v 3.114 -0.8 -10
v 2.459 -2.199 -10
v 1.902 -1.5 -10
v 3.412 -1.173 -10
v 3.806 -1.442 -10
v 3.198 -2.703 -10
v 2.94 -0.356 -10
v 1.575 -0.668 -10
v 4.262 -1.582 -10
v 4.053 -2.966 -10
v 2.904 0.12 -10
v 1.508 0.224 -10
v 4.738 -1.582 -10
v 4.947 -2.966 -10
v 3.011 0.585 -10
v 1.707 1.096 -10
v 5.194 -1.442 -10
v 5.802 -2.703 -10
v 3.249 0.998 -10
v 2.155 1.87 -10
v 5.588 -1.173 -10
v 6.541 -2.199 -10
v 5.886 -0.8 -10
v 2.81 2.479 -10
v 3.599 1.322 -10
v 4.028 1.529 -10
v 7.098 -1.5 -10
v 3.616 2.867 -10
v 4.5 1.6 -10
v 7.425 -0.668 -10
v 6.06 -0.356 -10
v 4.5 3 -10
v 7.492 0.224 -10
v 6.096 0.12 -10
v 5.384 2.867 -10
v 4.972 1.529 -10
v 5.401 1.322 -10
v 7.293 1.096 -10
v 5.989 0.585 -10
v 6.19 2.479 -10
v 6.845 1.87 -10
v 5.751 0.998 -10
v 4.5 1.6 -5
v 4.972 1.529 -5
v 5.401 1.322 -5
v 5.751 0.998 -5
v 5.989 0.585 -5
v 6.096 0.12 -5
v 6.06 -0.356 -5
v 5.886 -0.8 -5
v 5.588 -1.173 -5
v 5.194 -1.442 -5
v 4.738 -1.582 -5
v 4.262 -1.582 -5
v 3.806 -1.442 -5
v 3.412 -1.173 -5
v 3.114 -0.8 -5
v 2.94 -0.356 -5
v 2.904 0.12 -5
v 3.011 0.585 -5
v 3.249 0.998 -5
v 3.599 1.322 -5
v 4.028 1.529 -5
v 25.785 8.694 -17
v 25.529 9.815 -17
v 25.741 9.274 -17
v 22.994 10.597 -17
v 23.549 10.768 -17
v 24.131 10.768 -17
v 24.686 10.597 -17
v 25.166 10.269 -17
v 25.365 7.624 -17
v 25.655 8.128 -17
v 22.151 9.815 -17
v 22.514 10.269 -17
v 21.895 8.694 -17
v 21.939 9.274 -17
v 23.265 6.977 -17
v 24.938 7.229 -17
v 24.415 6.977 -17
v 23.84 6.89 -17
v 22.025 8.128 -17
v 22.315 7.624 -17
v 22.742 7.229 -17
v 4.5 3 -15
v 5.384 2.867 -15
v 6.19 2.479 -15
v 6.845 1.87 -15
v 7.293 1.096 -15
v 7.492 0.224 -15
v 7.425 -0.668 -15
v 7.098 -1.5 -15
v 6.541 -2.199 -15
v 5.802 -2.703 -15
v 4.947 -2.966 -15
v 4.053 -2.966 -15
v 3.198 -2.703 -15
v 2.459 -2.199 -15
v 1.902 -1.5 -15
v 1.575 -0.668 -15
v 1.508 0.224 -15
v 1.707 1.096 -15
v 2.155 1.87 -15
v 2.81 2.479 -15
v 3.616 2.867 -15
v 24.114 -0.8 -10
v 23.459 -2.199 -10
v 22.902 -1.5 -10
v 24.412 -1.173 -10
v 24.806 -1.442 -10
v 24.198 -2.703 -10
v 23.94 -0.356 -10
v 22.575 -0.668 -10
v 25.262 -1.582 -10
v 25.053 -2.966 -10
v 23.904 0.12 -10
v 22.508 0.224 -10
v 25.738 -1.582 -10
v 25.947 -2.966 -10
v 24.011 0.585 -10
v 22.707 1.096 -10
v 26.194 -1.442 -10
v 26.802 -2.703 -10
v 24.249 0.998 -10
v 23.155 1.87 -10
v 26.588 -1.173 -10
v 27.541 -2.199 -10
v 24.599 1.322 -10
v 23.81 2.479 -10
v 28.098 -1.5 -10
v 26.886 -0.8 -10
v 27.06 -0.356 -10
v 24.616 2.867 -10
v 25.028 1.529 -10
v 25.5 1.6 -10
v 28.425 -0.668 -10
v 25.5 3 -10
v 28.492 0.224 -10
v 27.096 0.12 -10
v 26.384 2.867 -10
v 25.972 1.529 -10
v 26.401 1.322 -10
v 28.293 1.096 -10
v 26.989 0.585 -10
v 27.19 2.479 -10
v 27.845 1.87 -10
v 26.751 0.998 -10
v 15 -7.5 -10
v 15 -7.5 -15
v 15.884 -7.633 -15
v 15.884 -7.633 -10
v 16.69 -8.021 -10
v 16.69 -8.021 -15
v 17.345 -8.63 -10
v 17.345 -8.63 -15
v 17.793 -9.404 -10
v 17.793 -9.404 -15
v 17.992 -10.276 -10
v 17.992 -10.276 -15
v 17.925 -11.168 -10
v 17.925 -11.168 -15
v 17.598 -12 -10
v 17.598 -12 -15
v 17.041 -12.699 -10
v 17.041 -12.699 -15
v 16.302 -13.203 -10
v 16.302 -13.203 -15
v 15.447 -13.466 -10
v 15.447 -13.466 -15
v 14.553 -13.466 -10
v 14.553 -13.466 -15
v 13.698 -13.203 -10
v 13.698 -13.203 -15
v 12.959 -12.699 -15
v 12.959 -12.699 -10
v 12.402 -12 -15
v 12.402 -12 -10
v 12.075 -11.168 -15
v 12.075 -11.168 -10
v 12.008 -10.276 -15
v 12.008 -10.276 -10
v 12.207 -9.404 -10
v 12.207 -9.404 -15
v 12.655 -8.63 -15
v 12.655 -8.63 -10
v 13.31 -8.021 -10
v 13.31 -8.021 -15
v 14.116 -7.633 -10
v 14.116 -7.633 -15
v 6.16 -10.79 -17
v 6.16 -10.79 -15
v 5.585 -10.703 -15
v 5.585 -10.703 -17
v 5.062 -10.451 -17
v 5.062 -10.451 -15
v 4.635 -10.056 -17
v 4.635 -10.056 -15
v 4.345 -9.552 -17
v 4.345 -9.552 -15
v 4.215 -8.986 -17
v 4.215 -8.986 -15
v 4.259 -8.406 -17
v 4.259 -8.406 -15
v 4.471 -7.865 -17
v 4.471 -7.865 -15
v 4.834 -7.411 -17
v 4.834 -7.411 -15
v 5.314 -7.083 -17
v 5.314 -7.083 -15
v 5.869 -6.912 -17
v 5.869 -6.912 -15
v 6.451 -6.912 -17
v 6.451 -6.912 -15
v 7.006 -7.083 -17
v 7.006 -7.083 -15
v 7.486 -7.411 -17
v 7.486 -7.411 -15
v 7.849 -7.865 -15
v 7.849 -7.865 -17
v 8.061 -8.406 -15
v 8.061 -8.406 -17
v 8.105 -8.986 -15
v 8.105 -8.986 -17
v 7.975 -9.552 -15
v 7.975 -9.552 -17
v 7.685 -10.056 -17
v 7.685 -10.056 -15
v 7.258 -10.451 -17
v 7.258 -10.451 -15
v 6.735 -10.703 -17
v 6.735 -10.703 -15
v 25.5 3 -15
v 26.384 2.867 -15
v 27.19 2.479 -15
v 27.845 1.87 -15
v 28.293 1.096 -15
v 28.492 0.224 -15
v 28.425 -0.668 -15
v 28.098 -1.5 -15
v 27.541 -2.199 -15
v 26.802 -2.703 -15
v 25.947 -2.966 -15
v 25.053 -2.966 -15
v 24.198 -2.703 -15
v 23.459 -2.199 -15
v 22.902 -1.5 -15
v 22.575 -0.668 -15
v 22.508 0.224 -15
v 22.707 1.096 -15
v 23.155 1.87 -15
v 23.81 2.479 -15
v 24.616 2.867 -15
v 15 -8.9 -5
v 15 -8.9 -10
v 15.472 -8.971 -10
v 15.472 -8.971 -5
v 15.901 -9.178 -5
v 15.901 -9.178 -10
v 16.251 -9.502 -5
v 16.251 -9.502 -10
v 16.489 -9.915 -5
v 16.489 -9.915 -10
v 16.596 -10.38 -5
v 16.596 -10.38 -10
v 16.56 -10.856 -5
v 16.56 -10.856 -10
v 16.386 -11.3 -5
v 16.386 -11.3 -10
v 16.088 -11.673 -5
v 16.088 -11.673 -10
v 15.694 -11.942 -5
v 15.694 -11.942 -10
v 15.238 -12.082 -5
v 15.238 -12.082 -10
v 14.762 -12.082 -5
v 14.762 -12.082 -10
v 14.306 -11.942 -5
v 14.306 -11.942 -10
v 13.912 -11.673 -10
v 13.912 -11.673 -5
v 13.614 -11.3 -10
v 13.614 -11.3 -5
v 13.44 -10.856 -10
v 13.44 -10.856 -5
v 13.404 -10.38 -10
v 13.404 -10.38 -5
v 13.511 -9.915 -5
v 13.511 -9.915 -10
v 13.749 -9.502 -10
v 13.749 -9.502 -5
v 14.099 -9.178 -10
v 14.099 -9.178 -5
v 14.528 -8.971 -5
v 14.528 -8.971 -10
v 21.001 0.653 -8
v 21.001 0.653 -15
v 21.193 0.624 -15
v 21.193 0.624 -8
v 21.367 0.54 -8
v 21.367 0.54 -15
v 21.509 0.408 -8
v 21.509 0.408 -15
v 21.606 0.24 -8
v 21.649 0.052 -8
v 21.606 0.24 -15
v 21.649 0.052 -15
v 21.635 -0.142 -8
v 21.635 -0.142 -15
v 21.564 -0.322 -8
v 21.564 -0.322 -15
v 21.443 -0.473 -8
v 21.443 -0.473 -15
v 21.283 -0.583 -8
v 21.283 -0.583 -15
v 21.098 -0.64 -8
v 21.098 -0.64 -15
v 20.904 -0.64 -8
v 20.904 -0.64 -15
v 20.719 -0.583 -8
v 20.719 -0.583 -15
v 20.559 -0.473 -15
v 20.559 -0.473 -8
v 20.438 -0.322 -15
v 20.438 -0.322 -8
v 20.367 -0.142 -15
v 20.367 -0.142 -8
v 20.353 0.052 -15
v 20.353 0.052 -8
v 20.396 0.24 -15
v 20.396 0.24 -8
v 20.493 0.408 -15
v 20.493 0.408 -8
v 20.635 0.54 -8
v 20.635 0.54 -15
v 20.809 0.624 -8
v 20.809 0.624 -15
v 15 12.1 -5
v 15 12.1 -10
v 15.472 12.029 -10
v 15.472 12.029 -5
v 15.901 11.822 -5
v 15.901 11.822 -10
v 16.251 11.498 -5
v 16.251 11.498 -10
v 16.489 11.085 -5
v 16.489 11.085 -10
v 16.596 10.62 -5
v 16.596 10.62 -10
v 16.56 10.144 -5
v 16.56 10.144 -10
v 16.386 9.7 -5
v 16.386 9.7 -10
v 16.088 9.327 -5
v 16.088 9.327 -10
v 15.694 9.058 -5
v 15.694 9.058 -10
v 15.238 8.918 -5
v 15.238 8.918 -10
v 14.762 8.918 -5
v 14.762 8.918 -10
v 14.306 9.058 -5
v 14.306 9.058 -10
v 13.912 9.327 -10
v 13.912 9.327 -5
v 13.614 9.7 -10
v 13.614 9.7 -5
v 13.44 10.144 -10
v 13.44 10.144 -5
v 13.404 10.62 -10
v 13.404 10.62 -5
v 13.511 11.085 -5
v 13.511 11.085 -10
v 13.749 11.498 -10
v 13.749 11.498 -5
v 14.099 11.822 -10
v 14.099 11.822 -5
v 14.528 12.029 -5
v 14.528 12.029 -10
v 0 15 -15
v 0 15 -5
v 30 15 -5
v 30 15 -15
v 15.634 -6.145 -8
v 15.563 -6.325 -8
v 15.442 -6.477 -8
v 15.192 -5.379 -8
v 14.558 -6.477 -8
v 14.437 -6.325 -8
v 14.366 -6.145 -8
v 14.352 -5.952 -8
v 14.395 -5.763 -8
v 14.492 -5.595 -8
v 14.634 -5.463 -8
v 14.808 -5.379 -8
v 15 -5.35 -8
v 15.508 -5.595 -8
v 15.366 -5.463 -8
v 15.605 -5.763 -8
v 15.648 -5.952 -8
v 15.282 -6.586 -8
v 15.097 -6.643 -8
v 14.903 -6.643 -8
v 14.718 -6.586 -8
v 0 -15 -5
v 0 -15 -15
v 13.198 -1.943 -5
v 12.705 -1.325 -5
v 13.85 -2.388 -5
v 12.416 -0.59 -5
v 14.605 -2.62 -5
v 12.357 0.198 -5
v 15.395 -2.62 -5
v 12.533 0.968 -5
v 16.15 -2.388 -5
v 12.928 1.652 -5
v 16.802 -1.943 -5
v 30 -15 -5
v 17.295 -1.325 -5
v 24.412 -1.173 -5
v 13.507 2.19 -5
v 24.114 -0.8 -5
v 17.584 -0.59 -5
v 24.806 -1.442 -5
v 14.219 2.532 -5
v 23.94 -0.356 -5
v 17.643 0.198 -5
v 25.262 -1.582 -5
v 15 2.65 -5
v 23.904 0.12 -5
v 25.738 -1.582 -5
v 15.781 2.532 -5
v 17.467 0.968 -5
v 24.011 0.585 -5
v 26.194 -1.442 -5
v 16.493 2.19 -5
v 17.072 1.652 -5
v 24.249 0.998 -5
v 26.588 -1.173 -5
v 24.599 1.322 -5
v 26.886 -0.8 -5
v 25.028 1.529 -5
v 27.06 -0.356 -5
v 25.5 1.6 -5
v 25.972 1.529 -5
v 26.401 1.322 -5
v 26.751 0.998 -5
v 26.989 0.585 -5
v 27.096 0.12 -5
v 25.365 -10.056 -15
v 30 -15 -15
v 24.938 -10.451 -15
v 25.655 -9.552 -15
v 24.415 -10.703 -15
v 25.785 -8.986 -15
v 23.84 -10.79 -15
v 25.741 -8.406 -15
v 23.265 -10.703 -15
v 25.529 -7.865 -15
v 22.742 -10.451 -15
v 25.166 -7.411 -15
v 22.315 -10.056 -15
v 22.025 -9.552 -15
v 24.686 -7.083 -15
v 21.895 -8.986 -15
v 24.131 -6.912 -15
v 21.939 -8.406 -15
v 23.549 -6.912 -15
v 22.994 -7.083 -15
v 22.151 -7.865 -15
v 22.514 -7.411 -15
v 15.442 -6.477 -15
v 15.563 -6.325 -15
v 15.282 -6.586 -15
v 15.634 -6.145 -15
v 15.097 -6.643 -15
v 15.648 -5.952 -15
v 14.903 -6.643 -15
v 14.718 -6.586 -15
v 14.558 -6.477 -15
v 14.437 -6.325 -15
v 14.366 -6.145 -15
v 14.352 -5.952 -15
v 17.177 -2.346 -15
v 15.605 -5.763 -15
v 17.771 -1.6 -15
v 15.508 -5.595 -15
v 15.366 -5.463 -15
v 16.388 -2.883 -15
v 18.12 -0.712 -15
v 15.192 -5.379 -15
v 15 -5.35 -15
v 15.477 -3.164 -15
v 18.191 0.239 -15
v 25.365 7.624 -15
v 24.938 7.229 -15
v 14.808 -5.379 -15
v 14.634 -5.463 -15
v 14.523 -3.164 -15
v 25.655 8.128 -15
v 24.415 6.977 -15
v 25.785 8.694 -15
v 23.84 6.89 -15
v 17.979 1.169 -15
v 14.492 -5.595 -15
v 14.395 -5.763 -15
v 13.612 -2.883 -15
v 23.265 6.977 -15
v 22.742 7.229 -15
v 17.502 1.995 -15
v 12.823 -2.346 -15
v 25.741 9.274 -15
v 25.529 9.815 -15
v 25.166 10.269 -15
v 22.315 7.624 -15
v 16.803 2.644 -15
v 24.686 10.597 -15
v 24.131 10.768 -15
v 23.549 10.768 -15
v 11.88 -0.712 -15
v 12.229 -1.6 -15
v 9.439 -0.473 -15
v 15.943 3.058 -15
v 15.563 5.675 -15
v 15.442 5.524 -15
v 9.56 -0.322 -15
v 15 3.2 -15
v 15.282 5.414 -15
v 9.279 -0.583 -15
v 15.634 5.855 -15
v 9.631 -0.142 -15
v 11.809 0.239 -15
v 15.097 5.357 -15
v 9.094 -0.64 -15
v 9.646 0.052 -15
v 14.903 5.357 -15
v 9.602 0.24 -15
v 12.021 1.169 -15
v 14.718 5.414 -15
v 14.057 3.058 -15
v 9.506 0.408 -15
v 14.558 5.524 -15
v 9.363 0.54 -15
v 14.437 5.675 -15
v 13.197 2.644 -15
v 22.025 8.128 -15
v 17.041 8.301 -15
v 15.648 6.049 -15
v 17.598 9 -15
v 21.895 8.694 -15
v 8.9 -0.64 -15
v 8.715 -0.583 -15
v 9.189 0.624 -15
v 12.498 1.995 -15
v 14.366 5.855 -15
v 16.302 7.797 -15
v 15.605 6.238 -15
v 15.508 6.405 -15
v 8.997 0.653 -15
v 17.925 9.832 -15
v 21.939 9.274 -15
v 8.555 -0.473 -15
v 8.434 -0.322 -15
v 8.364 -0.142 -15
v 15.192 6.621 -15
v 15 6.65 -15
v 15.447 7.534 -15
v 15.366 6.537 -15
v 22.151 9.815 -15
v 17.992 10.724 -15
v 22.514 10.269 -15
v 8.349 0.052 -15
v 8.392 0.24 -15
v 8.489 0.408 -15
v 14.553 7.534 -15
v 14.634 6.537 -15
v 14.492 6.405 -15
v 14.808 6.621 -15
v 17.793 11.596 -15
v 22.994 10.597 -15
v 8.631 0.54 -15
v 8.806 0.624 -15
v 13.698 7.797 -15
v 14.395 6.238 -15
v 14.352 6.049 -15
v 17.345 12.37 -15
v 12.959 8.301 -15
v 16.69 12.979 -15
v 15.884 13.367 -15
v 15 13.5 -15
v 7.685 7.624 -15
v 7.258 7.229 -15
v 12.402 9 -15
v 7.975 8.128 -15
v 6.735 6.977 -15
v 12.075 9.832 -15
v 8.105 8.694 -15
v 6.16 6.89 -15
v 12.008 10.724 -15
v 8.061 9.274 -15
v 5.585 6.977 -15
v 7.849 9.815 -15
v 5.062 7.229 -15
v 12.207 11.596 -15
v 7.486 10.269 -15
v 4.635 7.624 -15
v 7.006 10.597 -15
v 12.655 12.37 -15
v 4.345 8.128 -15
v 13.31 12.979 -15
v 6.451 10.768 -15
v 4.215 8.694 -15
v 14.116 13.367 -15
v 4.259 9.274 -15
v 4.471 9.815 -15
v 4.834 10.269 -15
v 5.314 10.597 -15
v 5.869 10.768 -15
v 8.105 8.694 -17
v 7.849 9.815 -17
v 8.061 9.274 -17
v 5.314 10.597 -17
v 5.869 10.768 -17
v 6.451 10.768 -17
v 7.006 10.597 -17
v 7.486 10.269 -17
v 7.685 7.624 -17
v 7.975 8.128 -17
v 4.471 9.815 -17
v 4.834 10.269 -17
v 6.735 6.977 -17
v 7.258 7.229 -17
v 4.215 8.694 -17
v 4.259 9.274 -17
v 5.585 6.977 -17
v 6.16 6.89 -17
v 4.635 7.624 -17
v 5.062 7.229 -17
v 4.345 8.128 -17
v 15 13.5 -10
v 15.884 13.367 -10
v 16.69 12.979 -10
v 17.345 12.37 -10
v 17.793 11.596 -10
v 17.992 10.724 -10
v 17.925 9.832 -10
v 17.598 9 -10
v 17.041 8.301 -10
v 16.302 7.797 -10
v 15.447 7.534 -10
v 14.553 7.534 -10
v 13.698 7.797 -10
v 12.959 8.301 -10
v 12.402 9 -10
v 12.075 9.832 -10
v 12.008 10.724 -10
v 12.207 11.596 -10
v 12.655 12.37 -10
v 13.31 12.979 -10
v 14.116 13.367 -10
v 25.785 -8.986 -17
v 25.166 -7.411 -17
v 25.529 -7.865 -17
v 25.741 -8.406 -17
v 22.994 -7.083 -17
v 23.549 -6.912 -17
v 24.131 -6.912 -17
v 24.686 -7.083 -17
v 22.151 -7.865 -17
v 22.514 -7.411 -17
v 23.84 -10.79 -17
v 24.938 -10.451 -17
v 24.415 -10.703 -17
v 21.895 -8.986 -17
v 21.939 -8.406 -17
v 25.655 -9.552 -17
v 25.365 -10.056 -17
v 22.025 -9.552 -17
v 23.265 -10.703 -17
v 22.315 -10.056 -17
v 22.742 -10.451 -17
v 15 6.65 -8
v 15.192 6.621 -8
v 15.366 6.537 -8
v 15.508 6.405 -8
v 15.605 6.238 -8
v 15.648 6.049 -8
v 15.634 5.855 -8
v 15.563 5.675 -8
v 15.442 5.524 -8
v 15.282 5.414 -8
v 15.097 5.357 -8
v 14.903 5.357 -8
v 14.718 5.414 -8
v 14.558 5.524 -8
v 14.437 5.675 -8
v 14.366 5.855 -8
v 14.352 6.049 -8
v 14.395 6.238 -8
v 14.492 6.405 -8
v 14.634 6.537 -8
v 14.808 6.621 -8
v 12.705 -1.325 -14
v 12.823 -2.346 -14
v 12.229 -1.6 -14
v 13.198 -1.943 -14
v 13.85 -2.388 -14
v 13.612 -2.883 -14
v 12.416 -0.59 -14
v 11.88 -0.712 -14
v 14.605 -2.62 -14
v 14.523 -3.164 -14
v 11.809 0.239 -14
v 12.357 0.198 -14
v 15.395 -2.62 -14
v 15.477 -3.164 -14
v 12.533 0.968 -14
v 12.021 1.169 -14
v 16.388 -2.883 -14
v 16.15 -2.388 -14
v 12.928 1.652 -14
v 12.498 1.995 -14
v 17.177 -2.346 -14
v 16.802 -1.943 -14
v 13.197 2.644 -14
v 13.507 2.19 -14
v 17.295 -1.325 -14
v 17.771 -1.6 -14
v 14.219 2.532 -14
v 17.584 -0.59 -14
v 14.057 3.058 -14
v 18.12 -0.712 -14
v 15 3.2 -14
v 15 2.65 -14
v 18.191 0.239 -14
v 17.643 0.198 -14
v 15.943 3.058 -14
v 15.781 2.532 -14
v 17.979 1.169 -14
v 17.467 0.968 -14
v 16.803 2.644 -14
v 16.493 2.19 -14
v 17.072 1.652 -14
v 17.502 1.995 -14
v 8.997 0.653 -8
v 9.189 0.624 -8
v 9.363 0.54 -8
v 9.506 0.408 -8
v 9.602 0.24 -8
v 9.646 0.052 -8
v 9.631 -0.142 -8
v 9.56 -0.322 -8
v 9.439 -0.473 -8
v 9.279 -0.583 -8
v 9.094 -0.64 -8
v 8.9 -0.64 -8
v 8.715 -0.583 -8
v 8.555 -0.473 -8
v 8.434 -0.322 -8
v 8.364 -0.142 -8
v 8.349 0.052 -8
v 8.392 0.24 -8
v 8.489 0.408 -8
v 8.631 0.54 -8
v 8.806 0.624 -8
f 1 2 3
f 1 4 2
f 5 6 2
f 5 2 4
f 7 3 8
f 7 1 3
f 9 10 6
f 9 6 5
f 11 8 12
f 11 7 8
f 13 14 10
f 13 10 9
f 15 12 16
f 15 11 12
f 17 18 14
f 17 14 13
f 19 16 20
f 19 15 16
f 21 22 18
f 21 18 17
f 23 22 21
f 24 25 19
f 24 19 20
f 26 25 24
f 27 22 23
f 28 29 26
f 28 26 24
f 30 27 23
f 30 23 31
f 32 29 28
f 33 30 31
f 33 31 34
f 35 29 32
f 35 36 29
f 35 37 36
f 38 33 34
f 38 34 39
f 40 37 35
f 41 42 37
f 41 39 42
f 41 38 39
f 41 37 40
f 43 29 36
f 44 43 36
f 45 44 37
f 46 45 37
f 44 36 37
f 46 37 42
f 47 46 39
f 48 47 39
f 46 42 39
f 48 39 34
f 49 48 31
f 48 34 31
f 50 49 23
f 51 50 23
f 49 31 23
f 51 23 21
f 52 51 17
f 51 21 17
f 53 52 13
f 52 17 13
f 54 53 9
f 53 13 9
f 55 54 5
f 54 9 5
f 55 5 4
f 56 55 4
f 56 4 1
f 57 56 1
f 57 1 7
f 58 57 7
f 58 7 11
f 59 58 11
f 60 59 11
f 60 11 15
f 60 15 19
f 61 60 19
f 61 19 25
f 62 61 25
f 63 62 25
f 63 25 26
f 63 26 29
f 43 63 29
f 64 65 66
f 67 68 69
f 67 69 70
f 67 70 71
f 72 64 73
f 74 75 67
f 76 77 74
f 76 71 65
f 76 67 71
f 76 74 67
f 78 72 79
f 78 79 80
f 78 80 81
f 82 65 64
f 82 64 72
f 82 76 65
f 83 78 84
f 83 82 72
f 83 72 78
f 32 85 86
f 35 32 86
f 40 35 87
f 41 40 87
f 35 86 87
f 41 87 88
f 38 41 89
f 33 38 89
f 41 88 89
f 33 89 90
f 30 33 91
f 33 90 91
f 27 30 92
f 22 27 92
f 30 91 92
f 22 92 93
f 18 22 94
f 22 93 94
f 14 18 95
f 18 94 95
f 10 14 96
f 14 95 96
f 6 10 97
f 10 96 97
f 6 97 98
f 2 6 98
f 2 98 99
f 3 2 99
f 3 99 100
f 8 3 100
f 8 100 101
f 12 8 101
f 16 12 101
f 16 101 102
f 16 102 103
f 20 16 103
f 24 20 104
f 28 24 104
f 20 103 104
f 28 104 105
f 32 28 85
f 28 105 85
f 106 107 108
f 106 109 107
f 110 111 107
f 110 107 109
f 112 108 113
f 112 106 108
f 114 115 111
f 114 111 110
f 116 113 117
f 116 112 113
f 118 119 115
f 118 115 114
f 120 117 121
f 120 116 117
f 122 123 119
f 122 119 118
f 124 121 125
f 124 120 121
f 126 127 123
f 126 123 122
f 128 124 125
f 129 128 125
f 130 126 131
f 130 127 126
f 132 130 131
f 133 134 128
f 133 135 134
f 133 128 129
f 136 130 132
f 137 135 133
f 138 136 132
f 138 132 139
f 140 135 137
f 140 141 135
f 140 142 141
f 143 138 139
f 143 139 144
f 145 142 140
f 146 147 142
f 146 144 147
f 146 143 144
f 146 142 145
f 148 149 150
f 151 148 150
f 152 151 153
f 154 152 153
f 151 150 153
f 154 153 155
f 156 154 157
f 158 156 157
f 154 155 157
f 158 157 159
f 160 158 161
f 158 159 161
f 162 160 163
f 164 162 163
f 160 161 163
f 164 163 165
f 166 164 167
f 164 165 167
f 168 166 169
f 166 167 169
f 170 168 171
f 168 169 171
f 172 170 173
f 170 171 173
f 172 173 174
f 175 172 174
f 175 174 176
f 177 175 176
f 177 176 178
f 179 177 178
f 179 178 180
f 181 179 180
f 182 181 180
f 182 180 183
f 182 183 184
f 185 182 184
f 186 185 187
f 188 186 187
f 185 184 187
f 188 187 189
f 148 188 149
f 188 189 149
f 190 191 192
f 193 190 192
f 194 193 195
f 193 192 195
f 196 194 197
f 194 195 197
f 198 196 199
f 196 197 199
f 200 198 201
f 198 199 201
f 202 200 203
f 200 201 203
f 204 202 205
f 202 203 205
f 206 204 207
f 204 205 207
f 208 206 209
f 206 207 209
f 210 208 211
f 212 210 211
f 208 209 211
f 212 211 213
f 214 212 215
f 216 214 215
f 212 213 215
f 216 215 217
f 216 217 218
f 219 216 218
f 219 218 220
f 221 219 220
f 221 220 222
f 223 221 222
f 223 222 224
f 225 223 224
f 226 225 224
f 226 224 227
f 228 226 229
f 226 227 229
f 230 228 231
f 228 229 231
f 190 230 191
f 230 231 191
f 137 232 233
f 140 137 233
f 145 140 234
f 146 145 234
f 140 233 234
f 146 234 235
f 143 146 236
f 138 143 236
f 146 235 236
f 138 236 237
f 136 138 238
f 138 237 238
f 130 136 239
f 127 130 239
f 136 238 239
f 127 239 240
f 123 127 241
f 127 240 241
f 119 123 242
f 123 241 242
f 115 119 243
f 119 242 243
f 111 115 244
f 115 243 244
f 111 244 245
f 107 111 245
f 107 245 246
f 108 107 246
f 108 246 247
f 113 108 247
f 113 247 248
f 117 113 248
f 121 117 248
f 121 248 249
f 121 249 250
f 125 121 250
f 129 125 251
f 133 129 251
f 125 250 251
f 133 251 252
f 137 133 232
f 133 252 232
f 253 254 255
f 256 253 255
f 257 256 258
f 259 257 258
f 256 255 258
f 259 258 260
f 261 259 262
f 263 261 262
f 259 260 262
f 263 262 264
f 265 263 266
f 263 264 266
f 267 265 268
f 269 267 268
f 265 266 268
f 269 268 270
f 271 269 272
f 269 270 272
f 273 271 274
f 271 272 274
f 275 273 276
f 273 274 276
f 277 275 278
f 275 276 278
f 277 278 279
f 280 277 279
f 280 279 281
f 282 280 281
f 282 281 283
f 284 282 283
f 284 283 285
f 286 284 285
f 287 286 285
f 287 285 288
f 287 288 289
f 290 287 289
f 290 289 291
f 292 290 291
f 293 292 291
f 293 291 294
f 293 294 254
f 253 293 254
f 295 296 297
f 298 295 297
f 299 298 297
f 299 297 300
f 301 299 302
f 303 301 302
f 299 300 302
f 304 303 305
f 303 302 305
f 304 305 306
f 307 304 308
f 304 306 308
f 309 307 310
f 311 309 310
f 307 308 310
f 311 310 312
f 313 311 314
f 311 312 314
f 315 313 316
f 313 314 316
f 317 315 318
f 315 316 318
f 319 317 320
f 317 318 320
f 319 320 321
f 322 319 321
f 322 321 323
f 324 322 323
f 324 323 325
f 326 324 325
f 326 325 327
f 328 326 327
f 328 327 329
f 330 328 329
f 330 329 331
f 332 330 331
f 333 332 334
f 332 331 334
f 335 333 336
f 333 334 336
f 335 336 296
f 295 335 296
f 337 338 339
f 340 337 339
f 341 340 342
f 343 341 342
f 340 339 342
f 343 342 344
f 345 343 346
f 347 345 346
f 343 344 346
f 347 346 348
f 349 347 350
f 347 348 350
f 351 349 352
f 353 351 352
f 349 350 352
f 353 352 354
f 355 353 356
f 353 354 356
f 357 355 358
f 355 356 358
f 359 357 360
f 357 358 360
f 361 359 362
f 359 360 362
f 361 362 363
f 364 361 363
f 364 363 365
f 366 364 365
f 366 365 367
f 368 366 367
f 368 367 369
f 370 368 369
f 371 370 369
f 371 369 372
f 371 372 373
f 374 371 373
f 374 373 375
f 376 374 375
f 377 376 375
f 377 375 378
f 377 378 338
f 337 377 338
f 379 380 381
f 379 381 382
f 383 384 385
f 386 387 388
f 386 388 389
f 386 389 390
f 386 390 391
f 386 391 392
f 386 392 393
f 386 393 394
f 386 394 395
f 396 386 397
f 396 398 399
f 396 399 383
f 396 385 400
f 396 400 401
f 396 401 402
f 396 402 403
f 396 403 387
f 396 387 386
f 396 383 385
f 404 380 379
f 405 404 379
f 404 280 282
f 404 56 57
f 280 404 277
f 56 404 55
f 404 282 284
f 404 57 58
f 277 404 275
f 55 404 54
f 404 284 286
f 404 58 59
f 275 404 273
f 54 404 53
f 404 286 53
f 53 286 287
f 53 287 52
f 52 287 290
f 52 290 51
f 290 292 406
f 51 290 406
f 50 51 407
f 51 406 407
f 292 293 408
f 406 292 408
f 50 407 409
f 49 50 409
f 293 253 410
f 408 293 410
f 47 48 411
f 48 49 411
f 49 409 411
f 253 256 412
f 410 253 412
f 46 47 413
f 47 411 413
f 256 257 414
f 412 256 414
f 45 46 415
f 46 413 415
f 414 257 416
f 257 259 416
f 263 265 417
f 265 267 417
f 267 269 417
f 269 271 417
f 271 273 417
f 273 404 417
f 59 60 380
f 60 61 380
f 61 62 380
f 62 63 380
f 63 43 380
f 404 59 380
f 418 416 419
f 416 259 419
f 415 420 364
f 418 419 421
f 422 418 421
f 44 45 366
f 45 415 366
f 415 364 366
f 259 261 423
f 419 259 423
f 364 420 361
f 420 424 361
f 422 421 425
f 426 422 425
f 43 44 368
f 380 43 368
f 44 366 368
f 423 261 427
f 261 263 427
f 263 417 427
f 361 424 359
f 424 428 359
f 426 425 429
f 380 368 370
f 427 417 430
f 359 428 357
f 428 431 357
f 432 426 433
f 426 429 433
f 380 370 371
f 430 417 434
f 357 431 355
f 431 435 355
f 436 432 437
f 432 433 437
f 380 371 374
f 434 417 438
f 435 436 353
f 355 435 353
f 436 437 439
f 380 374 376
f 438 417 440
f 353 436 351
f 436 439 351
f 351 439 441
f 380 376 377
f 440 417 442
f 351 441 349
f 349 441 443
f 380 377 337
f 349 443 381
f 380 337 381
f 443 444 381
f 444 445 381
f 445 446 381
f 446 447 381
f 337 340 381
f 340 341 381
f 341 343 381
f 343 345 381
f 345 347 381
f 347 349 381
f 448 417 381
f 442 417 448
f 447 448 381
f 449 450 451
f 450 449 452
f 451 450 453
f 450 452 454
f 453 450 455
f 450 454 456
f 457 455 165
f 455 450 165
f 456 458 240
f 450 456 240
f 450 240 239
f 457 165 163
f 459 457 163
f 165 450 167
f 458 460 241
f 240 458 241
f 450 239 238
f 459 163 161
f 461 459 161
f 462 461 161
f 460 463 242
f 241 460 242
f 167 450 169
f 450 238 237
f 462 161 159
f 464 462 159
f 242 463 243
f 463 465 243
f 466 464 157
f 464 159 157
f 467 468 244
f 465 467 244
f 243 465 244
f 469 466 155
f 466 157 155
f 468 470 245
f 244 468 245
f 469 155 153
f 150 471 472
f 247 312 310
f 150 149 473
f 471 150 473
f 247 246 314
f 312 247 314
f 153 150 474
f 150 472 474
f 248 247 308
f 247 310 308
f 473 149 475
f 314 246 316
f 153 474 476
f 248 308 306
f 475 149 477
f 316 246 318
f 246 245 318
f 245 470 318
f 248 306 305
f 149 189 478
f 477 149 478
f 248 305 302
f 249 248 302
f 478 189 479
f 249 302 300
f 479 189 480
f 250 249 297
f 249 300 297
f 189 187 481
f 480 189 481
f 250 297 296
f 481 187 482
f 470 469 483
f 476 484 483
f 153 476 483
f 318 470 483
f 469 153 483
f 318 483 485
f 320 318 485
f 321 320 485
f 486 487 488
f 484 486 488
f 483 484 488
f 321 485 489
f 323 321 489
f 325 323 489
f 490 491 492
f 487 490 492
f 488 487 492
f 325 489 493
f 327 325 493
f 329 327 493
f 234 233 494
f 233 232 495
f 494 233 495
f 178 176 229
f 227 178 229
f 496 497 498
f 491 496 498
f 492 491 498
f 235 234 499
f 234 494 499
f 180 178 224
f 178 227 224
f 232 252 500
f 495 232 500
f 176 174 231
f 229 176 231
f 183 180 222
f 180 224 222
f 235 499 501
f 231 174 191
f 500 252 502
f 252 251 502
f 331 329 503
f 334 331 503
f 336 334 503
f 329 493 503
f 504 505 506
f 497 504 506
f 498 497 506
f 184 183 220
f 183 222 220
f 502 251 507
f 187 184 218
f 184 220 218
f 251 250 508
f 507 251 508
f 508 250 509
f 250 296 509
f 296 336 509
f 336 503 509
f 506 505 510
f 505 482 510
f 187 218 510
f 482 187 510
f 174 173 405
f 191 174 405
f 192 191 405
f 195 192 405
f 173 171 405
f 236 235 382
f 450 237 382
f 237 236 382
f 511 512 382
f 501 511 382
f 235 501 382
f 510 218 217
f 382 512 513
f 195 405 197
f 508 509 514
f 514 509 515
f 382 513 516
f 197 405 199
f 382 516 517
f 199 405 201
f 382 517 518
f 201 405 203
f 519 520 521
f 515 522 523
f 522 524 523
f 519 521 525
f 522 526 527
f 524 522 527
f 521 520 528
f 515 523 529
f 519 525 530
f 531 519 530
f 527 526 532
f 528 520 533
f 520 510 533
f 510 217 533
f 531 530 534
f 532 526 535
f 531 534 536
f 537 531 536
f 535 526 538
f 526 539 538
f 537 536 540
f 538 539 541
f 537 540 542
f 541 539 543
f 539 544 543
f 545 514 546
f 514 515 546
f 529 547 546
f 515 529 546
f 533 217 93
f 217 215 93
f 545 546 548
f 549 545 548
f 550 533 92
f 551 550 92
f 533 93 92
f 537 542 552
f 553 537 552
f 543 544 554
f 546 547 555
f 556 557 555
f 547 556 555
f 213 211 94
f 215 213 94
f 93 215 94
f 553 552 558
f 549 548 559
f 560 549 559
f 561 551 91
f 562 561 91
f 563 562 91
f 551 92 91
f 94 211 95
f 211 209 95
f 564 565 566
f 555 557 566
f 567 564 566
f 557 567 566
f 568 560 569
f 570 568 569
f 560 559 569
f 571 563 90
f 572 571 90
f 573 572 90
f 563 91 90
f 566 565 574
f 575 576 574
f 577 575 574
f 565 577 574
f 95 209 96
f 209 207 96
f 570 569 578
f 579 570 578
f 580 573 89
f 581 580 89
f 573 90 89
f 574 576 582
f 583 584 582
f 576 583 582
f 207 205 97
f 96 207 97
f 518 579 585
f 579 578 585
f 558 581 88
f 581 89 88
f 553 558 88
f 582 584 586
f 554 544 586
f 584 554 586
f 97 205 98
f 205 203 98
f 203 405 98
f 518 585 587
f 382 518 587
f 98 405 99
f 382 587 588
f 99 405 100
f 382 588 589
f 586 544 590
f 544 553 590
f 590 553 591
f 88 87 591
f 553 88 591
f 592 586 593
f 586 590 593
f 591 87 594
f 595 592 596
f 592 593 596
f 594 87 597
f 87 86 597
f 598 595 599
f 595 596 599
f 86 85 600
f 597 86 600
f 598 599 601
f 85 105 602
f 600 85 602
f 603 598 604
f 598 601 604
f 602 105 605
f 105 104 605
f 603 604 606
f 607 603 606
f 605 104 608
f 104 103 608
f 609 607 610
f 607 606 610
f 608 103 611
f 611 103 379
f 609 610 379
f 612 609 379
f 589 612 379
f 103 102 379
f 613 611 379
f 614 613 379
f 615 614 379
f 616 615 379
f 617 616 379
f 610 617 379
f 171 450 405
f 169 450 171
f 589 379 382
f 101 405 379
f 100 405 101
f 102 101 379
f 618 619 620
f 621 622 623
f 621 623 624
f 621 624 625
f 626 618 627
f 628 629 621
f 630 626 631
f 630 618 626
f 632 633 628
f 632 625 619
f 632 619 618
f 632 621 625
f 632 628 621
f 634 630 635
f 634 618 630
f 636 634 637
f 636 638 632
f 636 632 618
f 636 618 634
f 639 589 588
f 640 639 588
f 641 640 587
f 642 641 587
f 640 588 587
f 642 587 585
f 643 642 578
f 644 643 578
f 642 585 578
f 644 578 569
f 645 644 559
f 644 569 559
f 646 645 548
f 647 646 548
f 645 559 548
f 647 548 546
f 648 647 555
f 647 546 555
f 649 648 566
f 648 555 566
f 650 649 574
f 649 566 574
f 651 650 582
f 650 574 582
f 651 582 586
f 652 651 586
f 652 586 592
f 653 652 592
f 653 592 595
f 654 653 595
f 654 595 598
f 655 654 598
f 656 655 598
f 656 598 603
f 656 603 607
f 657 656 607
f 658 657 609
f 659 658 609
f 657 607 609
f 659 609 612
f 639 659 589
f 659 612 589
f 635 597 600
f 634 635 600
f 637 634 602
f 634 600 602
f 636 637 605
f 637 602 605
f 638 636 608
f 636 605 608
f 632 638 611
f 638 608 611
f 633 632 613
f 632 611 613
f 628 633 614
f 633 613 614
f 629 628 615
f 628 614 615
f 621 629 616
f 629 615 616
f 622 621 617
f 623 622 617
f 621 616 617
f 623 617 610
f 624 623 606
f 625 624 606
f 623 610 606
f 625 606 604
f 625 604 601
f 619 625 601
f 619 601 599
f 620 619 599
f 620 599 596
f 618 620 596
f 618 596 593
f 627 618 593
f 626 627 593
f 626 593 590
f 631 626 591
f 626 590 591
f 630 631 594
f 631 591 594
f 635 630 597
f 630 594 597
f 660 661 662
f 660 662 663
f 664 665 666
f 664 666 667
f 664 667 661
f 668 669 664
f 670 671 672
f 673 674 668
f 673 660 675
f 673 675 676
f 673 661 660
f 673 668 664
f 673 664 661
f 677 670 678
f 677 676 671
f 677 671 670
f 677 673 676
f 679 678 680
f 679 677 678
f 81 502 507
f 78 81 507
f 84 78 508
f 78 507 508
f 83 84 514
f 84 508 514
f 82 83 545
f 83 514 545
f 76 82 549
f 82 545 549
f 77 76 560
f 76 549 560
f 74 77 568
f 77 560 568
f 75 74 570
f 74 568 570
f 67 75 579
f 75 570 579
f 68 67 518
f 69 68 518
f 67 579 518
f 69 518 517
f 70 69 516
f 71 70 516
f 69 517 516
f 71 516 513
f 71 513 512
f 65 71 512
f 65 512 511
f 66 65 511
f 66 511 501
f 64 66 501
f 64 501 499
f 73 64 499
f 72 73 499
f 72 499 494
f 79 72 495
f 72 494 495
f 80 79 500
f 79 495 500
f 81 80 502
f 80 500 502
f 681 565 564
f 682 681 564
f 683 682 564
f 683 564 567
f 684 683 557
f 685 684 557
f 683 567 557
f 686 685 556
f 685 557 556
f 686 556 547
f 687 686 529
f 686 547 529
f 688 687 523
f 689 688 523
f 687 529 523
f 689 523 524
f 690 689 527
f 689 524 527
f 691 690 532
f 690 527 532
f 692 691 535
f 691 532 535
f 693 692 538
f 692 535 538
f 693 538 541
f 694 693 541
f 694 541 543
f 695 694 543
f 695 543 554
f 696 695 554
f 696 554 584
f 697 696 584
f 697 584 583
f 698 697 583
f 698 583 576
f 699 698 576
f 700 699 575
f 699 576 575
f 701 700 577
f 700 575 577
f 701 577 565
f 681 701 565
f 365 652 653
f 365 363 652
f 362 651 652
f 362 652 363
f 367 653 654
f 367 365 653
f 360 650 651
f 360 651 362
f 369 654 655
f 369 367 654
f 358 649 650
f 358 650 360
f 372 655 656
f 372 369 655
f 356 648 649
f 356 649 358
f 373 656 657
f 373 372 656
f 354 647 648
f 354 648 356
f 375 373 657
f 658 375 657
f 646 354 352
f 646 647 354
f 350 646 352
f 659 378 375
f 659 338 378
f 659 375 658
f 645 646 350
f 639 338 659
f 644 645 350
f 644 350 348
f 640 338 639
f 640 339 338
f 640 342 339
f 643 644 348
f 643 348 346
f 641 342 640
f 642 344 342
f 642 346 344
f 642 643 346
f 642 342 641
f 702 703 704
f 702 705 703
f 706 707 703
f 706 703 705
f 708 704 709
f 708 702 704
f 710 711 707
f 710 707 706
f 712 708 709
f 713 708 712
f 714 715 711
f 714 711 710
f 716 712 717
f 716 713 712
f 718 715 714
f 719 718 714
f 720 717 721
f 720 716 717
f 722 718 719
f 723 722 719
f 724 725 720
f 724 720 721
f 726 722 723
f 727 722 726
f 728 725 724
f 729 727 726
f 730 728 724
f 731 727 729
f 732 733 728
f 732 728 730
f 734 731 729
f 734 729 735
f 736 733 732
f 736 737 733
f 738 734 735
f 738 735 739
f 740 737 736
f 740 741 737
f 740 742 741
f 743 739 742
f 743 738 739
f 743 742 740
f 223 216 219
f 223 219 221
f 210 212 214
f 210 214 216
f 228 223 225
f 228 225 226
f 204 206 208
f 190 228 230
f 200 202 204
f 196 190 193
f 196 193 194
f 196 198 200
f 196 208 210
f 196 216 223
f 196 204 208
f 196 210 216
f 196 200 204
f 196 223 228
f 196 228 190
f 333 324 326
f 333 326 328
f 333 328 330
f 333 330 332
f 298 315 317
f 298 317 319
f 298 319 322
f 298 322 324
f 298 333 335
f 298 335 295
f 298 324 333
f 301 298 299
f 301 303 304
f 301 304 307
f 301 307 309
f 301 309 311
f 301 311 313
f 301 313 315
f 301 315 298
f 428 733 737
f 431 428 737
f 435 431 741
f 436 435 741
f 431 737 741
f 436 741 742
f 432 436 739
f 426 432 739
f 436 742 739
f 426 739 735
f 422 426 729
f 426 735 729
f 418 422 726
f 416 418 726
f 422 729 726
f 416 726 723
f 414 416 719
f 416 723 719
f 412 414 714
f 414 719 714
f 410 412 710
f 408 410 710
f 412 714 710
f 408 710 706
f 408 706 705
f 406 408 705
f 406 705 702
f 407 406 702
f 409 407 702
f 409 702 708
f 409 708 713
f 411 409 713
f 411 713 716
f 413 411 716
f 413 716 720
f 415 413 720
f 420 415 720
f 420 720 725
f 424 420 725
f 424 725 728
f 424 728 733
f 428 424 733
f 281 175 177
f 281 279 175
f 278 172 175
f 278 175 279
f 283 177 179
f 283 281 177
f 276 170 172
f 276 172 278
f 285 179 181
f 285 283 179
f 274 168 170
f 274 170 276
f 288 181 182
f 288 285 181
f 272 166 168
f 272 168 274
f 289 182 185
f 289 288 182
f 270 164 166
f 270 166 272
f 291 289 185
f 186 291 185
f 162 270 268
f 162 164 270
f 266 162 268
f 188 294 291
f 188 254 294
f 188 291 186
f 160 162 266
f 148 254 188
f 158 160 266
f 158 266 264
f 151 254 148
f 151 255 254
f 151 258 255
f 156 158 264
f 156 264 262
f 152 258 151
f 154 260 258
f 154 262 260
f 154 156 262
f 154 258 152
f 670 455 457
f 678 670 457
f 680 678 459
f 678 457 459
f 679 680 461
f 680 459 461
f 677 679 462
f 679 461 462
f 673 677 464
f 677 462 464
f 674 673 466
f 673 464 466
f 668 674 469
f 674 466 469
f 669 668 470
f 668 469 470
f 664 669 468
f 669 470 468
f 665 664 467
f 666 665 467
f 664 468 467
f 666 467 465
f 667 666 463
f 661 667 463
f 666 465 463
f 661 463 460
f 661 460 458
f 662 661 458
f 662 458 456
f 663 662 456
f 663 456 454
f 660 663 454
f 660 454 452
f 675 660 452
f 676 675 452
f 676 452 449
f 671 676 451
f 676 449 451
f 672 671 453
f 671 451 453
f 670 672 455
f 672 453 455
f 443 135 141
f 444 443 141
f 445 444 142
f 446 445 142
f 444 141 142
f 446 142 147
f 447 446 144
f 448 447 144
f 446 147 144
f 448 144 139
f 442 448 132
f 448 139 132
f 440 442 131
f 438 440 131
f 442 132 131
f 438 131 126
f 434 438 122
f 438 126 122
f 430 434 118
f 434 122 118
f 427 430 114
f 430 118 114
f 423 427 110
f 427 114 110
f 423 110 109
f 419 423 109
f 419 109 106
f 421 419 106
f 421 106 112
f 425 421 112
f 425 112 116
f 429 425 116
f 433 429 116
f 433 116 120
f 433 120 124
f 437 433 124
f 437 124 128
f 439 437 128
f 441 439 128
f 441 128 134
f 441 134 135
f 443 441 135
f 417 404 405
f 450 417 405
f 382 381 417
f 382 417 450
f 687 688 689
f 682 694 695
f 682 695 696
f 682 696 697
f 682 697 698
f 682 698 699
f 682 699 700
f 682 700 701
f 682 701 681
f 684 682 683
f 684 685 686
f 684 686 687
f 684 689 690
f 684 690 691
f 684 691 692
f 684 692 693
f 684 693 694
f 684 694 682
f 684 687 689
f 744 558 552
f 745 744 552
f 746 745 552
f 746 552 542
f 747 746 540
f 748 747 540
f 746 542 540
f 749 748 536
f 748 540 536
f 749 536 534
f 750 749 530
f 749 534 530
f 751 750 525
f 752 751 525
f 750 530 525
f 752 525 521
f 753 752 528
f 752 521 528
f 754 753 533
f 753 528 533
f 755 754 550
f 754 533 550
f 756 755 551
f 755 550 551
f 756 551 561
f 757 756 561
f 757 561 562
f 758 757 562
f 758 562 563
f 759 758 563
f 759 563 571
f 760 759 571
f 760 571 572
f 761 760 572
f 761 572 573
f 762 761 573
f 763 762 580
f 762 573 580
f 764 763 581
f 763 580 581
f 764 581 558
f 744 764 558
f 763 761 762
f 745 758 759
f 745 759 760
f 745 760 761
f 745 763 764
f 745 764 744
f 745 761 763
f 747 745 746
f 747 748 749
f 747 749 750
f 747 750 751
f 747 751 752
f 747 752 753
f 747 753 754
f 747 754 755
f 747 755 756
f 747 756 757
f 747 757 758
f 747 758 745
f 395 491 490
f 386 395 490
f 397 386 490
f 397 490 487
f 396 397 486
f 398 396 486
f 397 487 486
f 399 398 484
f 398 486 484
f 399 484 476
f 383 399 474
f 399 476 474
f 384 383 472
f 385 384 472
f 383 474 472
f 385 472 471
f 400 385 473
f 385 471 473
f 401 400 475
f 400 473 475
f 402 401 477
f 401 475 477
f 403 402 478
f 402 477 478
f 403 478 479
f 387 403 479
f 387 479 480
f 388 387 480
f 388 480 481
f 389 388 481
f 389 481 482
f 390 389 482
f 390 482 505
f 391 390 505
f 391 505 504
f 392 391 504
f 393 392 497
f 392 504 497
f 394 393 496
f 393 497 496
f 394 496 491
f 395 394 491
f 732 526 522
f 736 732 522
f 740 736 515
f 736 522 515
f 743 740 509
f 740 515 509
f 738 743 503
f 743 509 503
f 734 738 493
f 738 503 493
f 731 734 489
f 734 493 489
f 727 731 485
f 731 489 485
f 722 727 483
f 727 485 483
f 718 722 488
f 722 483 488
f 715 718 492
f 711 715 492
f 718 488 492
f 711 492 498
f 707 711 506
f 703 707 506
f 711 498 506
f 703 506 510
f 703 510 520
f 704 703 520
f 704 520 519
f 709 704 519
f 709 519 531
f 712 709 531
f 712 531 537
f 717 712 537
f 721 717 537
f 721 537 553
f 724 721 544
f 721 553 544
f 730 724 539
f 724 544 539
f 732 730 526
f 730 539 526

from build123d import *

# Parameters (mm, degrees)
SKETCH1_W           = 30
SKETCH1_H           = 30
BOSS_EXTRUDE1_DEPTH = 30
SKETCH2_R           = 0.65
CUT_EXTRUDE1_DEPTH  = 7
SKETCH3_R           = 1.95
BOSS_EXTRUDE2_DEPTH = 2
SKETCH4_R           = 3.2
SKETCH4_R_2         = 2.5
CUT_EXTRUDE2_DEPTH  = 1
SKETCH5_R           = 2.65
CUT_EXTRUDE3_DEPTH  = 46
SKETCH6_W           = 20
SKETCH6_H           = 32.666349305
CUT_EXTRUDE4_DEPTH  = 38.603191354
SKETCH7_R           = 3
CUT_EXTRUDE5_DEPTH  = 5
SKETCH8_R           = 1.6
CUT_EXTRUDE6_DEPTH  = 35.263683398


with BuildPart() as part:
    # Sketch1 → Boss-Extrude1 (new body)
    with BuildSketch(Plane(origin=(0, 0, 0), x_dir=(0, 0, -1), z_dir=(1, 0, 0))):
        Rectangle(SKETCH1_W, SKETCH1_H)
    extrude(amount=BOSS_EXTRUDE1_DEPTH)

    # Sketch2 → Cut-Extrude1 (cut)
    with BuildSketch(Plane(origin=(0, 0, -15), x_dir=(-1, 0, 0), z_dir=(0, 0, -1))):
        with Locations(Location((-15, 6.000101914, 0), (0, 0, 90))):
            Circle(SKETCH2_R)
        with Locations(Location((-21.001003121, 0.002997762, 0), (0, 0, 90))):
            Circle(SKETCH2_R)
        with Locations(Location((-8.997324254, 0.002997762, 0), (0, 0, 90))):
            Circle(SKETCH2_R)
        with Locations(Location((-15, -6.000101914, 0), (0, 0, 90))):
            Circle(SKETCH2_R)
    extrude(amount=-CUT_EXTRUDE1_DEPTH, mode=Mode.SUBTRACT)

    # Sketch3 → Boss-Extrude2 (add)
    with BuildSketch(Plane(origin=(0, 0, -15), x_dir=(-1, 0, 0), z_dir=(0, 0, -1))):
        with Locations(Location((-6.16, 8.84, 0), (0, 0, 270))):
            Circle(SKETCH3_R)
        with Locations(Location((-23.84, 8.84, 0), (0, 0, 270))):
            Circle(SKETCH3_R)
        with Locations(Location((-23.84, -8.84, 0), (0, 0, 270))):
            Circle(SKETCH3_R)
        with Locations(Location((-6.16, -8.84, 0), (0, 0, 270))):
            Circle(SKETCH3_R)
    extrude(amount=BOSS_EXTRUDE2_DEPTH)

    # Sketch4 → Cut-Extrude2 (cut)
    with BuildSketch(Plane(origin=(0, 0, -15), x_dir=(-1, 0, 0), z_dir=(0, 0, -1))):
        with Locations(Location((-15, 0, 0), (0, 0, 90))):
            Circle(SKETCH4_R)
        with Locations(Location((-15, 0, 0), (0, 0, 90))):
            Circle(SKETCH4_R_2, mode=Mode.SUBTRACT)
    extrude(amount=-CUT_EXTRUDE2_DEPTH, mode=Mode.SUBTRACT)

    # Sketch5 → Cut-Extrude3 (cut, through all)
    with BuildSketch(Plane(origin=(0, 0, -15), x_dir=(-1, 0, 0), z_dir=(0, 0, -1))):
        with Locations(Location((-15, 0, 0), (0, 0, 90))):
            Circle(SKETCH5_R)
    extrude(amount=-CUT_EXTRUDE3_DEPTH, mode=Mode.SUBTRACT)

    # Sketch6 → Cut-Extrude4 (cut, through all)
    with BuildSketch(Plane(origin=(30, 0, 0), x_dir=(0, 0, -1), z_dir=(1, 0, 0))):
        with Locations((-5, -1.333174652)):
            Rectangle(SKETCH6_W, SKETCH6_H)
    extrude(amount=-CUT_EXTRUDE4_DEPTH, mode=Mode.SUBTRACT)

    # Sketch7 → Cut-Extrude5 (cut)
    with BuildSketch(Plane(origin=(0, 0, -15), x_dir=(-1, 0, 0), z_dir=(0, 0, -1))):
        with Locations(Location((-15, 10.5, 0), (0, 0, 90))):
            Circle(SKETCH7_R)
        with Locations(Location((-15, -10.5, 0), (0, 0, 90))):
            Circle(SKETCH7_R)
        with Locations(Location((-25.5, 0, 0), (0, 0, 90))):
            Circle(SKETCH7_R)
        with Locations(Location((-4.5, 0, 0), (0, 0, 90))):
            Circle(SKETCH7_R)
    extrude(amount=-CUT_EXTRUDE5_DEPTH, mode=Mode.SUBTRACT)

    # Sketch8 → Cut-Extrude6 (cut, through all)
    with BuildSketch(Plane(origin=(0, 0, -10), x_dir=(-1, 0, 0), z_dir=(0, 0, -1))):
        with Locations(Location((-4.5, 0, 0), (0, 0, 90))):
            Circle(SKETCH8_R)
        with Locations(Location((-15, -10.5, 0), (0, 0, 90))):
            Circle(SKETCH8_R)
        with Locations(Location((-15, 10.5, 0), (0, 0, 90))):
            Circle(SKETCH8_R)
        with Locations(Location((-25.5, 0, 0), (0, 0, 90))):
            Circle(SKETCH8_R)
    extrude(amount=-CUT_EXTRUDE6_DEPTH, mode=Mode.SUBTRACT)


solid = part.part
